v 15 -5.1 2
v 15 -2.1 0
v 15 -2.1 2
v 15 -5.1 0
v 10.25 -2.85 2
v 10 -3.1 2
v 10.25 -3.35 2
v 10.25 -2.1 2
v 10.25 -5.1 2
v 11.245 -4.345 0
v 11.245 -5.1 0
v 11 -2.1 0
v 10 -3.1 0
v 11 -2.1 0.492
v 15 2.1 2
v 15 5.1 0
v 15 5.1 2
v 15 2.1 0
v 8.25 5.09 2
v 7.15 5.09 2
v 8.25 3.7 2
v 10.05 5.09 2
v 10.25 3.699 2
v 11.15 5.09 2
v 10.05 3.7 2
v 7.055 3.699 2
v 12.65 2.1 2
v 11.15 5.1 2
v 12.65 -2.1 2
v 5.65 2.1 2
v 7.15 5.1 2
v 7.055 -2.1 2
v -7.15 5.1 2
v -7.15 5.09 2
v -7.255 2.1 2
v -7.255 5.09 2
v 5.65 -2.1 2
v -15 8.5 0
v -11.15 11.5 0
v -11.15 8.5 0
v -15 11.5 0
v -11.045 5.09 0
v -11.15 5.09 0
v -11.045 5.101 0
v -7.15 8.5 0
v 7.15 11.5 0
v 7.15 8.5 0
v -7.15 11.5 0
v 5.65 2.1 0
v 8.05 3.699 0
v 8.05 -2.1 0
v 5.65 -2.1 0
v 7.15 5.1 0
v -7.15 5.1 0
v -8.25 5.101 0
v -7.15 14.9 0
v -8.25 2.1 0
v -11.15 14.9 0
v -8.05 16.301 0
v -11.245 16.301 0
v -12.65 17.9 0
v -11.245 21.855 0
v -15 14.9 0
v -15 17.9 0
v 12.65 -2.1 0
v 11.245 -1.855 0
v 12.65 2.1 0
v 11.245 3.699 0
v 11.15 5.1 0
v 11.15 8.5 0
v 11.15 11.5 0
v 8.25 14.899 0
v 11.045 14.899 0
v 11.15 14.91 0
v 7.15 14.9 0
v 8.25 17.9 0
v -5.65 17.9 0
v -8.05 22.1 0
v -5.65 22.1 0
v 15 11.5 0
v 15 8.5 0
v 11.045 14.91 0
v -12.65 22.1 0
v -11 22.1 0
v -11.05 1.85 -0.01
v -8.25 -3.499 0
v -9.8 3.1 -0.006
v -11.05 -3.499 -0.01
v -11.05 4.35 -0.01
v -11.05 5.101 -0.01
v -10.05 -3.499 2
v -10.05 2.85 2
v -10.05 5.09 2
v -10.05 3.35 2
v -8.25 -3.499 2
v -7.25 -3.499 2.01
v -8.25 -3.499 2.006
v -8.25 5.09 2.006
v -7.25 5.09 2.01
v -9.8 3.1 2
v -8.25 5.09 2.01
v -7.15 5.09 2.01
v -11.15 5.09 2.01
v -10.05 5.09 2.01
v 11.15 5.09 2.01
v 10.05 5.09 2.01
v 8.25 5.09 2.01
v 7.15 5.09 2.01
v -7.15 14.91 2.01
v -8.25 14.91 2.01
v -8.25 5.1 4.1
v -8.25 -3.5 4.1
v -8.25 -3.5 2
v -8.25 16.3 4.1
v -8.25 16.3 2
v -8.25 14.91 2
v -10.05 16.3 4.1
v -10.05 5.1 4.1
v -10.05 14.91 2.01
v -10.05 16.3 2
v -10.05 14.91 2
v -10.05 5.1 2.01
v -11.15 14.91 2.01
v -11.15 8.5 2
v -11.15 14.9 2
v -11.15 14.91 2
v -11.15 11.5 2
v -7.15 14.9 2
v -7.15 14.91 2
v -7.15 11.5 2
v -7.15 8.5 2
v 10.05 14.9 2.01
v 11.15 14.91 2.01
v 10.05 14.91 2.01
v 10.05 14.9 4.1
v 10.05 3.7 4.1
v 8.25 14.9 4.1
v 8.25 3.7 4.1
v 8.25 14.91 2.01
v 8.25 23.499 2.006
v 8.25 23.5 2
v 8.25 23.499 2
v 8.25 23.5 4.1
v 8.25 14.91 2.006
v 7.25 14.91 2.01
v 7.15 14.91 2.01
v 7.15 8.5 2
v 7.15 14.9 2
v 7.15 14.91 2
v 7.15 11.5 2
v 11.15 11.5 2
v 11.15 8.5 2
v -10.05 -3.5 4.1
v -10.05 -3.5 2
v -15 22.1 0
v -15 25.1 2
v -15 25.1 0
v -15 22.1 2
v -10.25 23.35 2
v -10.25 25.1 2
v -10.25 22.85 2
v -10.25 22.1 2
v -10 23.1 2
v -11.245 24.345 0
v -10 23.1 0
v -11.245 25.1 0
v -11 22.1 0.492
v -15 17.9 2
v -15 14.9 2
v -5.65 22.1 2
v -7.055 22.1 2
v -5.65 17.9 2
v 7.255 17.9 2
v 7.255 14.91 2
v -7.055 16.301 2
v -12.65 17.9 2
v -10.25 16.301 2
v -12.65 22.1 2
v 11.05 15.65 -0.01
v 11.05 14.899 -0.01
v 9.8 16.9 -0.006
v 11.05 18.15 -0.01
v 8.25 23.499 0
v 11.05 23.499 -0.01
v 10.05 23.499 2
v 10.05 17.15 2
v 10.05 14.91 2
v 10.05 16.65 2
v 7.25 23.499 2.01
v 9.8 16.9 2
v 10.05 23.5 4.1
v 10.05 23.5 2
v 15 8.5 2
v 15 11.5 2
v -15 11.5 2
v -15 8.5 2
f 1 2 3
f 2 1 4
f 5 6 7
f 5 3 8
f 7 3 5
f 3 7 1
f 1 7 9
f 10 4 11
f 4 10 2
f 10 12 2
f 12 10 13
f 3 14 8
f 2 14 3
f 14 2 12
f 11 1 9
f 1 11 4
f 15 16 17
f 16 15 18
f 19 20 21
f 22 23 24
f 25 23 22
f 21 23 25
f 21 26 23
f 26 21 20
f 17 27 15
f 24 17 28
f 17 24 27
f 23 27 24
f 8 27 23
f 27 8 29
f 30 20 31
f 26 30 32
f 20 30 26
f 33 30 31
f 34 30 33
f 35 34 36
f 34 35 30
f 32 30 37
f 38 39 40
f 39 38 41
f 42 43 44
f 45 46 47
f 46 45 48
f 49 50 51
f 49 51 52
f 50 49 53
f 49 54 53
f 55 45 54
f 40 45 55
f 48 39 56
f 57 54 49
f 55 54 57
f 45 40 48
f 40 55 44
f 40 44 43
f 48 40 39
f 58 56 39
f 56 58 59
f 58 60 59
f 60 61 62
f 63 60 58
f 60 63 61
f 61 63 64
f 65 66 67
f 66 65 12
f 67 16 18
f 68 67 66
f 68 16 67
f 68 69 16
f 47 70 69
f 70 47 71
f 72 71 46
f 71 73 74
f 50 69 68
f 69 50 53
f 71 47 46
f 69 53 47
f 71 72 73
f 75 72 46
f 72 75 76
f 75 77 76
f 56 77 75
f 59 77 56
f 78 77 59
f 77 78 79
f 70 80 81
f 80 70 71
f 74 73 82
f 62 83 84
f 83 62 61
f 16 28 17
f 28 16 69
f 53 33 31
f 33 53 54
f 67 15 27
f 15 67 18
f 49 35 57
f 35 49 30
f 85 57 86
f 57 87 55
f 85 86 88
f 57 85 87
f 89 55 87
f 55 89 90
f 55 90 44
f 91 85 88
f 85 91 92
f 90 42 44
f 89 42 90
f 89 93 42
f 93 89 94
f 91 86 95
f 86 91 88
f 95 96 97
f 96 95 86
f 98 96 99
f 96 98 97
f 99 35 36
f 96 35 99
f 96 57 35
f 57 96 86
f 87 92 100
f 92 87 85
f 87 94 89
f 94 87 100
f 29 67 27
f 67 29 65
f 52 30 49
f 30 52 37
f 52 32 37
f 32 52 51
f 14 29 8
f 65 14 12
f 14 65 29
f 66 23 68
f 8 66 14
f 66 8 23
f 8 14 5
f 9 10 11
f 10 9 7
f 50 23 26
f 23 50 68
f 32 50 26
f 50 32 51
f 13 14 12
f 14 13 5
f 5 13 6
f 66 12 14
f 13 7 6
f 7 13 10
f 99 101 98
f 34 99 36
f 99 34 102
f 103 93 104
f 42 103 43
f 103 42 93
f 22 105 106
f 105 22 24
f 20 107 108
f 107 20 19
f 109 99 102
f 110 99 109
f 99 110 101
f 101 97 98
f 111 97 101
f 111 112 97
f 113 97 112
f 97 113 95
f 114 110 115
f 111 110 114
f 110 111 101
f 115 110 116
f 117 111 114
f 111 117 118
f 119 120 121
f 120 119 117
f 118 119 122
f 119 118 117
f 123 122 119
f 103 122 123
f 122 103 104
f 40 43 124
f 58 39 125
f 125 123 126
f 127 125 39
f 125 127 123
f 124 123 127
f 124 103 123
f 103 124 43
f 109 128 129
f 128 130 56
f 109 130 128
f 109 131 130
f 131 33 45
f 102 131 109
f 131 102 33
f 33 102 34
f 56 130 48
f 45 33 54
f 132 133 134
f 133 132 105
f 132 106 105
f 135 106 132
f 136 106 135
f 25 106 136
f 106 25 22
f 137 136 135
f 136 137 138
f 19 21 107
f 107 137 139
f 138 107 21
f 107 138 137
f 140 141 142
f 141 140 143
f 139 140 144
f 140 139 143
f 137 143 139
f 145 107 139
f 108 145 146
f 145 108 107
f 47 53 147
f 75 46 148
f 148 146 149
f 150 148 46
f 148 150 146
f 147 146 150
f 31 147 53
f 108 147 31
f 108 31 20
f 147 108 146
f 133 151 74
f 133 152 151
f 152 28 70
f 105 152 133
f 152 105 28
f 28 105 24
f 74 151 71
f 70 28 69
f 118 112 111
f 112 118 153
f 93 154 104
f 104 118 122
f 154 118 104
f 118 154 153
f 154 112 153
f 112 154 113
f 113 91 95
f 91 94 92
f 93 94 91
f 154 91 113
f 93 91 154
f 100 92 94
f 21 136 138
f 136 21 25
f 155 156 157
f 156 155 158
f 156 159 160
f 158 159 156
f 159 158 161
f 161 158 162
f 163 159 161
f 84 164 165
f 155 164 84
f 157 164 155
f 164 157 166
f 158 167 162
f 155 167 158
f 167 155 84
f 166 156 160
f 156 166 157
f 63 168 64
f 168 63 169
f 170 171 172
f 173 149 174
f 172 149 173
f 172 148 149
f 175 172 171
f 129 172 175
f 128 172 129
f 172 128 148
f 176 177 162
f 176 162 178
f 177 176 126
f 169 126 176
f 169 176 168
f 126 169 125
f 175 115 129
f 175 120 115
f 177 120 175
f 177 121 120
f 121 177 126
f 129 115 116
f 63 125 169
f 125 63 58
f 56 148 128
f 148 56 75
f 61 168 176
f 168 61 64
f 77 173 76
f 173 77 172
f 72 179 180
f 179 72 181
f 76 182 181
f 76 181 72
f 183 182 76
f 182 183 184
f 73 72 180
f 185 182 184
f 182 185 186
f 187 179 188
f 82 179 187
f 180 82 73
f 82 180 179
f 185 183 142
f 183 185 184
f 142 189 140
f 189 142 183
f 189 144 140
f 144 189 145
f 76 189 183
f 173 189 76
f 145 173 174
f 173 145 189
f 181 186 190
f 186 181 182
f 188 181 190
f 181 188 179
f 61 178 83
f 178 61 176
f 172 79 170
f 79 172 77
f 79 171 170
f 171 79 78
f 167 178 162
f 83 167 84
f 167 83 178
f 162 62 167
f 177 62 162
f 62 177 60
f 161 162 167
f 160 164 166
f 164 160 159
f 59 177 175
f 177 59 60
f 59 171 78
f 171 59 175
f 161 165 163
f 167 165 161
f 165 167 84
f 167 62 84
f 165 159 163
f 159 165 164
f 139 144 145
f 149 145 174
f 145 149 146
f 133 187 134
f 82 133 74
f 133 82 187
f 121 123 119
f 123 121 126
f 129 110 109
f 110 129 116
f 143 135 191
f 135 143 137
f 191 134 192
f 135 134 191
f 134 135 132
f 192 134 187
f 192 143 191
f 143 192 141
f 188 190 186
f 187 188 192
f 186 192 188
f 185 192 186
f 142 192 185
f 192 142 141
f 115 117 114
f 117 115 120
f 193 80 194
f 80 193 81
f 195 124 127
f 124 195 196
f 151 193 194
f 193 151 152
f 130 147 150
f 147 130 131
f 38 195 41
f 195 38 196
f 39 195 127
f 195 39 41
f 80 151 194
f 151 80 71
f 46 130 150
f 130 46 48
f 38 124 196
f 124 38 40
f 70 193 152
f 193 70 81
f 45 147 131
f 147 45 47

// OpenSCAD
// file: track_primitives.scad
include <track_config.scad>

// 1. just a joint base
drawJointBase();

////////////////////////////// API ///////////////////////////////////////////

/// One half of joint (base, no tracks).
module drawJointBase() {translate([0, TIE_SPACING/2]) whole_joint_base();};

/// One half of whole joint (base + tracks).
/// Error margin added.
module drawJointX() {translate([0, TIE_SPACING/2]) whole_joint();};

/// Tie, center of tie is in the origin
module drawTie() {
    translate([0, -TIE_WIDTH/2]) tie();
}

//////////////////////////////////////////////////////////////////////////////

//================== TIE ==================
module tie_with_base() {
    union() {
        tie();
        translate([_TRACK_BASE_DX, -TIE_SPACING, 0]) {
            cube([TRACK_BASE_WIDTH, TIE_SPACING, TIE_HEIGHT]);
        }
        translate([-_TRACK_BASE_DX-TRACK_BASE_WIDTH, -TIE_SPACING, 0]) {
            cube([TRACK_BASE_WIDTH, TIE_SPACING, TIE_HEIGHT]);
        }
    }
}

module tie() {
    translate([-_TIE_DX, 0, 0]) {
        cube([TIE_LENGTH, TIE_WIDTH, TIE_HEIGHT]);
    }
}

module tie_half() { // TODO
    cube([TIE_LENGTH / 2, TIE_WIDTH, TIE_HEIGHT]);
}

//================== JOINT =====================

module base_joint(dx) {
    __JOINT_INDENT = sin(JOINT_RAIL_ANGLE) * TIE_HEIGHT / 2;
    difference() {
        ///
        translate([0,0.001,0])
        rotate(90, [1, 0, 0])
        linear_extrude(height = JOINT_LENGTH + TIE_WIDTH + dx)
            polygon(points =
                [[-JOINT_WIDTH/2 - __JOINT_INDENT - dx, 0-0.01],
                 [JOINT_WIDTH/2 - __JOINT_INDENT  + dx, 0],
                 [JOINT_WIDTH/2 + __JOINT_INDENT  + dx, TIE_HEIGHT+0.01],
                 [-JOINT_WIDTH/2 + __JOINT_INDENT - dx, TIE_HEIGHT]]
                );
        // xxx
//        translate([-2-dx,-2,0])
//            rotate(45, [0,0,1])
//                translate([-JOINT_SIZE/2,-JOINT_SIZE/2,-0.01])
//                    cube([JOINT_SIZE,JOINT_SIZE,TIE_HEIGHT+0.02]);
        // TODO first is depth, second is distance along rail "axis"
        translate([-0.75-dx,-2,-0.01])
                rotate(135, [0,0,1])
                    cube([5,5,TIE_HEIGHT+0.02]);
    }
}

// starting from tie edge
module whole_joint() {
    _left_track_length = JOINT_LENGTH+TIE_WIDTH-DDD;
    _right_track_length = _TIE_STEP-JOINT_LENGTH-DDD;
    union() {
        // joint base
        whole_joint_base();
        // rendering error
        translate([0, TIE_WIDTH+RENDERING_ERROR])
            rotate([90])
                linear_extrude(2*RENDERING_ERROR)
                    trackPlusBaseProfile();
        // left track
        translate([0, TIE_WIDTH])
            rotate([90])
                linear_extrude(_left_track_length)
                    leftTrackProfile();
        // right track
        translate([0, TIE_WIDTH])
            rotate([90])
                linear_extrude(_right_track_length)
                    rightTrackProfile();
    }
}

module whole_joint_base()
{
    difference(){
    union() {
        // very first TIE in joint (small bit)
        translate([0, -_TIE_STEP]) {
            intersection() {
                tie();
                translate([_TRACK_BASE_DX + TRACK_BASE_WIDTH/2, 0, 0]){
                    cube(TIE_LENGTH, TIE_WIDTH, TIE_HEIGHT);
                };
            }
        };
        // second TIE in joint (bigger bit)
        intersection() {
            tie();
            translate([-(GAUGE/2+TRACK_BASE_WIDTH/5), 0, 0]){
                cube(TIE_LENGTH, TIE_WIDTH, TIE_HEIGHT);
            }
        }
        // joint base sample
        // TODO DDD
        translate([_TRACK_BASE_DX - TRACK_BASE_JOINT_EXTRA_WIDTH, -TIE_SPACING, 0]) {
            cube([TRACK_BASE_WIDTH + 2*TRACK_BASE_JOINT_EXTRA_WIDTH, _TIE_STEP, TIE_HEIGHT]);
        }
        // joint
        translate([_TRACK_BASE_X_CENTRE, TIE_WIDTH]) {
            base_joint(-DDD); // a bit smaller
        }
        // antiwrap
        if (XXX_ANTIWARP > 0) {
            translate([-_TRACK_BASE_DX-TRACK_BASE_WIDTH/2, -_JOINT_EFFECTIVE_LENGTH])
                antiwarp();
            translate([_TRACK_BASE_DX+TRACK_BASE_WIDTH, -_JOINT_EFFECTIVE_LENGTH])
                antiwarp();
        }
    };
        // anti-joint
        translate([-_TRACK_BASE_X_CENTRE, -_TIE_STEP]) {
            //translate([-0.005, 0, -0.001]) scale(1.01)
                rotate(180, [0, 0, 1]) base_joint(DDD); // a bit larger
        };
    }
}

/////
module antiwarp() {
    _length = 5;
    _r = 10; // track dir
    _rx = 15;
    union() {
        translate([-XXX_HEAD_WIDTH/2, -_length-_r])
            cube([XXX_HEAD_WIDTH+0.1, _length+RENDERING_ERROR+_r, TIE_HEIGHT/2]);
        translate([0, -_length-_r]) scale([_rx/_r,1])
            cylinder(TIE_HEIGHT/2,_r,_r);
    }
}

//===================== TRACK ============================
module trackPlusBaseProfile(DrawTrackFlag = 1+2+4+8) {
    union() {
        trackProfile(DrawTrackFlag);
        trackBaseProfile(DrawTrackFlag);
    }
}

module trackBaseProfile(DrawTrackFlag=4+8) {
    union() {
        // left profile
        if (floor(DrawTrackFlag/4)%2==1) {
            translate([-TRACK_BASE_WIDTH-_TRACK_BASE_DX,0])
                square([TRACK_BASE_WIDTH,
                        TIE_HEIGHT + RENDERING_ERROR]);
        }
        // right profile
        if (floor(DrawTrackFlag/8)%2==1) {
            translate([_TRACK_BASE_DX,0])
                square([TRACK_BASE_WIDTH,
                        TIE_HEIGHT + RENDERING_ERROR]);
        }
    }
}

module trackProfile(DrawTrackFlag) {
    union() {
        // left profile
        if (DrawTrackFlag%2==1){
            leftTrackProfile();
        }
        // right profile
        if (floor(DrawTrackFlag/2)%2==1){
            rightTrackProfile();
        }
    }
}

module leftTrackProfile() {
    translate([-TRACK_WIDTH-GAUGE/2,TIE_HEIGHT])
        square([TRACK_WIDTH, TRACK_HEIGHT]);
}

module rightTrackProfile() {
    mirror()
        leftTrackProfile();
}
// file: track_config.scad
GAUGE = 16.5;
WHEELS_B = 14.55; // Back to back
WHEELS_K = 15.32; // Back to back + wheel inside gauge part thickness

// 1 - true, 0 - false
XXX_ANTIWARP = 0;

DDD = 0.1;

TRACK_WIDTH = 1.8;
TRACK_HEIGHT = 2.1;

TRACK_BASE_WIDTH = 4;
TRACK_BASE_JOINT_EXTRA_WIDTH = (7-TRACK_BASE_WIDTH) / 2;

TIE_LENGTH = 30;
TIE_WIDTH = 3;
TIE_HEIGHT = 2;
TIE_SPACING = 4.2; // TODO

JOINT_LENGTH = 4.2 + 3 / 2; // TIE_SPACING + TIE_WIDTH / 2;
JOINT_WIDTH = 3; // TODO
JOINT_RAIL_ANGLE = 30;
JOINT_SIZE = 2;

_JOINT_EFFECTIVE_LENGTH = 3 + 4.2 / 2; //TIE_WIDTH + TIE_SPACING / 2;
_TIE_STEP = TIE_WIDTH + TIE_SPACING;
_TIE_DX = TIE_LENGTH / 2;
_TRACK_BASE_DX = GAUGE / 2 - (TRACK_BASE_WIDTH - TRACK_WIDTH) / 2;
_TRACK_BASE_X_CENTRE = -_TRACK_BASE_DX-TRACK_BASE_WIDTH/2;
_TRACK_TOTAL_HEIGHT = TRACK_HEIGHT + TIE_HEIGHT;

RENDERING_ERROR = 0.01;
XXX_HEAD_WIDTH = 0.4;
// main file
include <track_config.scad>
use <track_primitives.scad>

//demo_track_basic();
module demo_track_basic(){
    translate([0,0]) drawCurveRocoR(2, 15);
    translate([-75,0]) drawStraightG(1/2);
}

_straight(20);

//================ main ================

// 2. sample on how joints fit together
// TODO rail(); translate([0,-4.3,0]) rotate([0,0,180]) rail();

// Roco R2 curve left, 15 degrees
//drawCurve(358, 15);

// Roco G1/2 115mm
//drawStraightG(1/2);

//drawCurve(358, 15);
//translate([0,-115,0])
//drawStraightG(1/2);

//drawSwitch(230, -358, 30);

//====================== API ======================
// Track starts and ends with joint.
// Joint takes 2 ties and is always the same (straight).
// By default all draw* methods traw track in Y-axis starting from origin.
//
//    Y->         JTTTTTTTTTT
//  X             J   T   T
//  |           0 J   T   T
//  V             J   T   T
//             JJJJTTTTTTTTTT

//- R2 -> 358mm radius (12pc., 30º each)
//- R3 -> 419,6mm " " "
//- R4 -> 481,2mm " " "
//- R5 -> 542,8mm " " "
//- R6 -> 604,4mm " " "
//- R9 -> 826,4mm " (24pc., 15º each)????
// negative = turn right;
module drawCurveRocoR(R, Angle) {curve(sign(R)*(358+61.6*(abs(R)-2)), Angle);}


/// Radius - millimeters (measured to the centre of the track;
///          negative -> turn right)
/// Angle - degrees
/// Seems as left curve, but you know, look from another side,
/// and it is right curve ;)
module drawCurve(Radius, Angle) {curve(Radius, Angle);}

/// G4 920mm
/// G1 230mm
/// G1/2 115mm
/// G1/4 57,5mm
module drawStraightG(G) {straightG(G);}

// straight with end-points
module straightG(G) {
    _straight(230 * G);
}

module _straight(Length, DrawBaseFlag=1, DrawTrackFlag=1+2+4+8) {
    _length = Length;
    _plain_length = _length - 2*_JOINT_EFFECTIVE_LENGTH;
    union() {
        // starting joint
        drawJointX();
        // ending joint
        translate([0, _length])
            rotate(180)
                drawJointX();
        // the rest of the track
        translate([0, _JOINT_EFFECTIVE_LENGTH])
            _plainStraight(_plain_length, DrawBaseFlag, DrawTrackFlag);
    }
}

// straight with tie spaces at the end
// length in mm
module _plainStraight(length, DrawBaseFlag=1, DrawTrackFlag = 1+2+4+8) {
    _tie_count = round ( (length + TIE_WIDTH) / _TIE_STEP) - 1;
    _tie_spacing = (length - _tie_count*TIE_WIDTH) / (_tie_count+1);
    union() {
        // track
        translate([0,length])
        rotate(90, [1, 0, 0])
            linear_extrude(length)
                trackPlusBaseProfile(DrawTrackFlag);
        // ties
        if (DrawBaseFlag) {
            for (i = [1:_tie_count]) {
                _start_length = (i * (TIE_WIDTH+_tie_spacing) - TIE_WIDTH/2);
                translate([0, _start_length])
                    drawTie();
            }
        }
    }
}

// curve with end-joints
// joints themselves are straight, so for joint-free part we
// need to have tighter radius
//  TODO draw that romb with height = _JOINT_EFFECTIVE_LENGTH
module curve(Radius, Angle, DrawBaseFlag=1, DrawTrackFlag=1+2+4+8) {
    // TODO works for left (Radius positive)
    _DR = _JOINT_EFFECTIVE_LENGTH / tan(Angle/2);
    _Radius = sign(Radius) * (abs(Radius) - _DR);
    Angle = sign(_Radius) * Angle;
    union() {
        // starting joint
        drawJointX();
        // ending joint
        translate([-Radius, 0])
            rotate(Angle)
                translate([Radius, 0])
                    rotate(180)
                        drawJointX();
        translate([0, _JOINT_EFFECTIVE_LENGTH])
            plainCurve(_Radius, Angle, DrawBaseFlag, DrawTrackFlag);
    }
}

// Curve starts and ends with tie spacing
module plainCurve(Radius, Angle, DrawBaseFlag=1, DrawTrackFlag=1+2) {
    _length = Angle * PI / 180 * Radius;
    _tie_count = round ( (_length + TIE_WIDTH) / _TIE_STEP) - 1;
    _tie_spacing = (_length - _tie_count*TIE_WIDTH) / (_tie_count+1);
    union() {
        // track base + track
        translate([-Radius, 0])
            rotate_extrude(angle = Angle, $fn = 200) // TODO $fn
                translate([Radius, 0])
                    trackPlusBaseProfile(DrawTrackFlag);
        if (DrawBaseFlag) {
            // ties
            for (i = [1:_tie_count]) {
                _start_length = (i * (TIE_WIDTH+_tie_spacing) - TIE_WIDTH/2);
                translate([-Radius, 0])
                    rotate(_start_length / _length * Angle)
                        translate([Radius, 0])
                            drawTie();
            }
        }
    }
}
